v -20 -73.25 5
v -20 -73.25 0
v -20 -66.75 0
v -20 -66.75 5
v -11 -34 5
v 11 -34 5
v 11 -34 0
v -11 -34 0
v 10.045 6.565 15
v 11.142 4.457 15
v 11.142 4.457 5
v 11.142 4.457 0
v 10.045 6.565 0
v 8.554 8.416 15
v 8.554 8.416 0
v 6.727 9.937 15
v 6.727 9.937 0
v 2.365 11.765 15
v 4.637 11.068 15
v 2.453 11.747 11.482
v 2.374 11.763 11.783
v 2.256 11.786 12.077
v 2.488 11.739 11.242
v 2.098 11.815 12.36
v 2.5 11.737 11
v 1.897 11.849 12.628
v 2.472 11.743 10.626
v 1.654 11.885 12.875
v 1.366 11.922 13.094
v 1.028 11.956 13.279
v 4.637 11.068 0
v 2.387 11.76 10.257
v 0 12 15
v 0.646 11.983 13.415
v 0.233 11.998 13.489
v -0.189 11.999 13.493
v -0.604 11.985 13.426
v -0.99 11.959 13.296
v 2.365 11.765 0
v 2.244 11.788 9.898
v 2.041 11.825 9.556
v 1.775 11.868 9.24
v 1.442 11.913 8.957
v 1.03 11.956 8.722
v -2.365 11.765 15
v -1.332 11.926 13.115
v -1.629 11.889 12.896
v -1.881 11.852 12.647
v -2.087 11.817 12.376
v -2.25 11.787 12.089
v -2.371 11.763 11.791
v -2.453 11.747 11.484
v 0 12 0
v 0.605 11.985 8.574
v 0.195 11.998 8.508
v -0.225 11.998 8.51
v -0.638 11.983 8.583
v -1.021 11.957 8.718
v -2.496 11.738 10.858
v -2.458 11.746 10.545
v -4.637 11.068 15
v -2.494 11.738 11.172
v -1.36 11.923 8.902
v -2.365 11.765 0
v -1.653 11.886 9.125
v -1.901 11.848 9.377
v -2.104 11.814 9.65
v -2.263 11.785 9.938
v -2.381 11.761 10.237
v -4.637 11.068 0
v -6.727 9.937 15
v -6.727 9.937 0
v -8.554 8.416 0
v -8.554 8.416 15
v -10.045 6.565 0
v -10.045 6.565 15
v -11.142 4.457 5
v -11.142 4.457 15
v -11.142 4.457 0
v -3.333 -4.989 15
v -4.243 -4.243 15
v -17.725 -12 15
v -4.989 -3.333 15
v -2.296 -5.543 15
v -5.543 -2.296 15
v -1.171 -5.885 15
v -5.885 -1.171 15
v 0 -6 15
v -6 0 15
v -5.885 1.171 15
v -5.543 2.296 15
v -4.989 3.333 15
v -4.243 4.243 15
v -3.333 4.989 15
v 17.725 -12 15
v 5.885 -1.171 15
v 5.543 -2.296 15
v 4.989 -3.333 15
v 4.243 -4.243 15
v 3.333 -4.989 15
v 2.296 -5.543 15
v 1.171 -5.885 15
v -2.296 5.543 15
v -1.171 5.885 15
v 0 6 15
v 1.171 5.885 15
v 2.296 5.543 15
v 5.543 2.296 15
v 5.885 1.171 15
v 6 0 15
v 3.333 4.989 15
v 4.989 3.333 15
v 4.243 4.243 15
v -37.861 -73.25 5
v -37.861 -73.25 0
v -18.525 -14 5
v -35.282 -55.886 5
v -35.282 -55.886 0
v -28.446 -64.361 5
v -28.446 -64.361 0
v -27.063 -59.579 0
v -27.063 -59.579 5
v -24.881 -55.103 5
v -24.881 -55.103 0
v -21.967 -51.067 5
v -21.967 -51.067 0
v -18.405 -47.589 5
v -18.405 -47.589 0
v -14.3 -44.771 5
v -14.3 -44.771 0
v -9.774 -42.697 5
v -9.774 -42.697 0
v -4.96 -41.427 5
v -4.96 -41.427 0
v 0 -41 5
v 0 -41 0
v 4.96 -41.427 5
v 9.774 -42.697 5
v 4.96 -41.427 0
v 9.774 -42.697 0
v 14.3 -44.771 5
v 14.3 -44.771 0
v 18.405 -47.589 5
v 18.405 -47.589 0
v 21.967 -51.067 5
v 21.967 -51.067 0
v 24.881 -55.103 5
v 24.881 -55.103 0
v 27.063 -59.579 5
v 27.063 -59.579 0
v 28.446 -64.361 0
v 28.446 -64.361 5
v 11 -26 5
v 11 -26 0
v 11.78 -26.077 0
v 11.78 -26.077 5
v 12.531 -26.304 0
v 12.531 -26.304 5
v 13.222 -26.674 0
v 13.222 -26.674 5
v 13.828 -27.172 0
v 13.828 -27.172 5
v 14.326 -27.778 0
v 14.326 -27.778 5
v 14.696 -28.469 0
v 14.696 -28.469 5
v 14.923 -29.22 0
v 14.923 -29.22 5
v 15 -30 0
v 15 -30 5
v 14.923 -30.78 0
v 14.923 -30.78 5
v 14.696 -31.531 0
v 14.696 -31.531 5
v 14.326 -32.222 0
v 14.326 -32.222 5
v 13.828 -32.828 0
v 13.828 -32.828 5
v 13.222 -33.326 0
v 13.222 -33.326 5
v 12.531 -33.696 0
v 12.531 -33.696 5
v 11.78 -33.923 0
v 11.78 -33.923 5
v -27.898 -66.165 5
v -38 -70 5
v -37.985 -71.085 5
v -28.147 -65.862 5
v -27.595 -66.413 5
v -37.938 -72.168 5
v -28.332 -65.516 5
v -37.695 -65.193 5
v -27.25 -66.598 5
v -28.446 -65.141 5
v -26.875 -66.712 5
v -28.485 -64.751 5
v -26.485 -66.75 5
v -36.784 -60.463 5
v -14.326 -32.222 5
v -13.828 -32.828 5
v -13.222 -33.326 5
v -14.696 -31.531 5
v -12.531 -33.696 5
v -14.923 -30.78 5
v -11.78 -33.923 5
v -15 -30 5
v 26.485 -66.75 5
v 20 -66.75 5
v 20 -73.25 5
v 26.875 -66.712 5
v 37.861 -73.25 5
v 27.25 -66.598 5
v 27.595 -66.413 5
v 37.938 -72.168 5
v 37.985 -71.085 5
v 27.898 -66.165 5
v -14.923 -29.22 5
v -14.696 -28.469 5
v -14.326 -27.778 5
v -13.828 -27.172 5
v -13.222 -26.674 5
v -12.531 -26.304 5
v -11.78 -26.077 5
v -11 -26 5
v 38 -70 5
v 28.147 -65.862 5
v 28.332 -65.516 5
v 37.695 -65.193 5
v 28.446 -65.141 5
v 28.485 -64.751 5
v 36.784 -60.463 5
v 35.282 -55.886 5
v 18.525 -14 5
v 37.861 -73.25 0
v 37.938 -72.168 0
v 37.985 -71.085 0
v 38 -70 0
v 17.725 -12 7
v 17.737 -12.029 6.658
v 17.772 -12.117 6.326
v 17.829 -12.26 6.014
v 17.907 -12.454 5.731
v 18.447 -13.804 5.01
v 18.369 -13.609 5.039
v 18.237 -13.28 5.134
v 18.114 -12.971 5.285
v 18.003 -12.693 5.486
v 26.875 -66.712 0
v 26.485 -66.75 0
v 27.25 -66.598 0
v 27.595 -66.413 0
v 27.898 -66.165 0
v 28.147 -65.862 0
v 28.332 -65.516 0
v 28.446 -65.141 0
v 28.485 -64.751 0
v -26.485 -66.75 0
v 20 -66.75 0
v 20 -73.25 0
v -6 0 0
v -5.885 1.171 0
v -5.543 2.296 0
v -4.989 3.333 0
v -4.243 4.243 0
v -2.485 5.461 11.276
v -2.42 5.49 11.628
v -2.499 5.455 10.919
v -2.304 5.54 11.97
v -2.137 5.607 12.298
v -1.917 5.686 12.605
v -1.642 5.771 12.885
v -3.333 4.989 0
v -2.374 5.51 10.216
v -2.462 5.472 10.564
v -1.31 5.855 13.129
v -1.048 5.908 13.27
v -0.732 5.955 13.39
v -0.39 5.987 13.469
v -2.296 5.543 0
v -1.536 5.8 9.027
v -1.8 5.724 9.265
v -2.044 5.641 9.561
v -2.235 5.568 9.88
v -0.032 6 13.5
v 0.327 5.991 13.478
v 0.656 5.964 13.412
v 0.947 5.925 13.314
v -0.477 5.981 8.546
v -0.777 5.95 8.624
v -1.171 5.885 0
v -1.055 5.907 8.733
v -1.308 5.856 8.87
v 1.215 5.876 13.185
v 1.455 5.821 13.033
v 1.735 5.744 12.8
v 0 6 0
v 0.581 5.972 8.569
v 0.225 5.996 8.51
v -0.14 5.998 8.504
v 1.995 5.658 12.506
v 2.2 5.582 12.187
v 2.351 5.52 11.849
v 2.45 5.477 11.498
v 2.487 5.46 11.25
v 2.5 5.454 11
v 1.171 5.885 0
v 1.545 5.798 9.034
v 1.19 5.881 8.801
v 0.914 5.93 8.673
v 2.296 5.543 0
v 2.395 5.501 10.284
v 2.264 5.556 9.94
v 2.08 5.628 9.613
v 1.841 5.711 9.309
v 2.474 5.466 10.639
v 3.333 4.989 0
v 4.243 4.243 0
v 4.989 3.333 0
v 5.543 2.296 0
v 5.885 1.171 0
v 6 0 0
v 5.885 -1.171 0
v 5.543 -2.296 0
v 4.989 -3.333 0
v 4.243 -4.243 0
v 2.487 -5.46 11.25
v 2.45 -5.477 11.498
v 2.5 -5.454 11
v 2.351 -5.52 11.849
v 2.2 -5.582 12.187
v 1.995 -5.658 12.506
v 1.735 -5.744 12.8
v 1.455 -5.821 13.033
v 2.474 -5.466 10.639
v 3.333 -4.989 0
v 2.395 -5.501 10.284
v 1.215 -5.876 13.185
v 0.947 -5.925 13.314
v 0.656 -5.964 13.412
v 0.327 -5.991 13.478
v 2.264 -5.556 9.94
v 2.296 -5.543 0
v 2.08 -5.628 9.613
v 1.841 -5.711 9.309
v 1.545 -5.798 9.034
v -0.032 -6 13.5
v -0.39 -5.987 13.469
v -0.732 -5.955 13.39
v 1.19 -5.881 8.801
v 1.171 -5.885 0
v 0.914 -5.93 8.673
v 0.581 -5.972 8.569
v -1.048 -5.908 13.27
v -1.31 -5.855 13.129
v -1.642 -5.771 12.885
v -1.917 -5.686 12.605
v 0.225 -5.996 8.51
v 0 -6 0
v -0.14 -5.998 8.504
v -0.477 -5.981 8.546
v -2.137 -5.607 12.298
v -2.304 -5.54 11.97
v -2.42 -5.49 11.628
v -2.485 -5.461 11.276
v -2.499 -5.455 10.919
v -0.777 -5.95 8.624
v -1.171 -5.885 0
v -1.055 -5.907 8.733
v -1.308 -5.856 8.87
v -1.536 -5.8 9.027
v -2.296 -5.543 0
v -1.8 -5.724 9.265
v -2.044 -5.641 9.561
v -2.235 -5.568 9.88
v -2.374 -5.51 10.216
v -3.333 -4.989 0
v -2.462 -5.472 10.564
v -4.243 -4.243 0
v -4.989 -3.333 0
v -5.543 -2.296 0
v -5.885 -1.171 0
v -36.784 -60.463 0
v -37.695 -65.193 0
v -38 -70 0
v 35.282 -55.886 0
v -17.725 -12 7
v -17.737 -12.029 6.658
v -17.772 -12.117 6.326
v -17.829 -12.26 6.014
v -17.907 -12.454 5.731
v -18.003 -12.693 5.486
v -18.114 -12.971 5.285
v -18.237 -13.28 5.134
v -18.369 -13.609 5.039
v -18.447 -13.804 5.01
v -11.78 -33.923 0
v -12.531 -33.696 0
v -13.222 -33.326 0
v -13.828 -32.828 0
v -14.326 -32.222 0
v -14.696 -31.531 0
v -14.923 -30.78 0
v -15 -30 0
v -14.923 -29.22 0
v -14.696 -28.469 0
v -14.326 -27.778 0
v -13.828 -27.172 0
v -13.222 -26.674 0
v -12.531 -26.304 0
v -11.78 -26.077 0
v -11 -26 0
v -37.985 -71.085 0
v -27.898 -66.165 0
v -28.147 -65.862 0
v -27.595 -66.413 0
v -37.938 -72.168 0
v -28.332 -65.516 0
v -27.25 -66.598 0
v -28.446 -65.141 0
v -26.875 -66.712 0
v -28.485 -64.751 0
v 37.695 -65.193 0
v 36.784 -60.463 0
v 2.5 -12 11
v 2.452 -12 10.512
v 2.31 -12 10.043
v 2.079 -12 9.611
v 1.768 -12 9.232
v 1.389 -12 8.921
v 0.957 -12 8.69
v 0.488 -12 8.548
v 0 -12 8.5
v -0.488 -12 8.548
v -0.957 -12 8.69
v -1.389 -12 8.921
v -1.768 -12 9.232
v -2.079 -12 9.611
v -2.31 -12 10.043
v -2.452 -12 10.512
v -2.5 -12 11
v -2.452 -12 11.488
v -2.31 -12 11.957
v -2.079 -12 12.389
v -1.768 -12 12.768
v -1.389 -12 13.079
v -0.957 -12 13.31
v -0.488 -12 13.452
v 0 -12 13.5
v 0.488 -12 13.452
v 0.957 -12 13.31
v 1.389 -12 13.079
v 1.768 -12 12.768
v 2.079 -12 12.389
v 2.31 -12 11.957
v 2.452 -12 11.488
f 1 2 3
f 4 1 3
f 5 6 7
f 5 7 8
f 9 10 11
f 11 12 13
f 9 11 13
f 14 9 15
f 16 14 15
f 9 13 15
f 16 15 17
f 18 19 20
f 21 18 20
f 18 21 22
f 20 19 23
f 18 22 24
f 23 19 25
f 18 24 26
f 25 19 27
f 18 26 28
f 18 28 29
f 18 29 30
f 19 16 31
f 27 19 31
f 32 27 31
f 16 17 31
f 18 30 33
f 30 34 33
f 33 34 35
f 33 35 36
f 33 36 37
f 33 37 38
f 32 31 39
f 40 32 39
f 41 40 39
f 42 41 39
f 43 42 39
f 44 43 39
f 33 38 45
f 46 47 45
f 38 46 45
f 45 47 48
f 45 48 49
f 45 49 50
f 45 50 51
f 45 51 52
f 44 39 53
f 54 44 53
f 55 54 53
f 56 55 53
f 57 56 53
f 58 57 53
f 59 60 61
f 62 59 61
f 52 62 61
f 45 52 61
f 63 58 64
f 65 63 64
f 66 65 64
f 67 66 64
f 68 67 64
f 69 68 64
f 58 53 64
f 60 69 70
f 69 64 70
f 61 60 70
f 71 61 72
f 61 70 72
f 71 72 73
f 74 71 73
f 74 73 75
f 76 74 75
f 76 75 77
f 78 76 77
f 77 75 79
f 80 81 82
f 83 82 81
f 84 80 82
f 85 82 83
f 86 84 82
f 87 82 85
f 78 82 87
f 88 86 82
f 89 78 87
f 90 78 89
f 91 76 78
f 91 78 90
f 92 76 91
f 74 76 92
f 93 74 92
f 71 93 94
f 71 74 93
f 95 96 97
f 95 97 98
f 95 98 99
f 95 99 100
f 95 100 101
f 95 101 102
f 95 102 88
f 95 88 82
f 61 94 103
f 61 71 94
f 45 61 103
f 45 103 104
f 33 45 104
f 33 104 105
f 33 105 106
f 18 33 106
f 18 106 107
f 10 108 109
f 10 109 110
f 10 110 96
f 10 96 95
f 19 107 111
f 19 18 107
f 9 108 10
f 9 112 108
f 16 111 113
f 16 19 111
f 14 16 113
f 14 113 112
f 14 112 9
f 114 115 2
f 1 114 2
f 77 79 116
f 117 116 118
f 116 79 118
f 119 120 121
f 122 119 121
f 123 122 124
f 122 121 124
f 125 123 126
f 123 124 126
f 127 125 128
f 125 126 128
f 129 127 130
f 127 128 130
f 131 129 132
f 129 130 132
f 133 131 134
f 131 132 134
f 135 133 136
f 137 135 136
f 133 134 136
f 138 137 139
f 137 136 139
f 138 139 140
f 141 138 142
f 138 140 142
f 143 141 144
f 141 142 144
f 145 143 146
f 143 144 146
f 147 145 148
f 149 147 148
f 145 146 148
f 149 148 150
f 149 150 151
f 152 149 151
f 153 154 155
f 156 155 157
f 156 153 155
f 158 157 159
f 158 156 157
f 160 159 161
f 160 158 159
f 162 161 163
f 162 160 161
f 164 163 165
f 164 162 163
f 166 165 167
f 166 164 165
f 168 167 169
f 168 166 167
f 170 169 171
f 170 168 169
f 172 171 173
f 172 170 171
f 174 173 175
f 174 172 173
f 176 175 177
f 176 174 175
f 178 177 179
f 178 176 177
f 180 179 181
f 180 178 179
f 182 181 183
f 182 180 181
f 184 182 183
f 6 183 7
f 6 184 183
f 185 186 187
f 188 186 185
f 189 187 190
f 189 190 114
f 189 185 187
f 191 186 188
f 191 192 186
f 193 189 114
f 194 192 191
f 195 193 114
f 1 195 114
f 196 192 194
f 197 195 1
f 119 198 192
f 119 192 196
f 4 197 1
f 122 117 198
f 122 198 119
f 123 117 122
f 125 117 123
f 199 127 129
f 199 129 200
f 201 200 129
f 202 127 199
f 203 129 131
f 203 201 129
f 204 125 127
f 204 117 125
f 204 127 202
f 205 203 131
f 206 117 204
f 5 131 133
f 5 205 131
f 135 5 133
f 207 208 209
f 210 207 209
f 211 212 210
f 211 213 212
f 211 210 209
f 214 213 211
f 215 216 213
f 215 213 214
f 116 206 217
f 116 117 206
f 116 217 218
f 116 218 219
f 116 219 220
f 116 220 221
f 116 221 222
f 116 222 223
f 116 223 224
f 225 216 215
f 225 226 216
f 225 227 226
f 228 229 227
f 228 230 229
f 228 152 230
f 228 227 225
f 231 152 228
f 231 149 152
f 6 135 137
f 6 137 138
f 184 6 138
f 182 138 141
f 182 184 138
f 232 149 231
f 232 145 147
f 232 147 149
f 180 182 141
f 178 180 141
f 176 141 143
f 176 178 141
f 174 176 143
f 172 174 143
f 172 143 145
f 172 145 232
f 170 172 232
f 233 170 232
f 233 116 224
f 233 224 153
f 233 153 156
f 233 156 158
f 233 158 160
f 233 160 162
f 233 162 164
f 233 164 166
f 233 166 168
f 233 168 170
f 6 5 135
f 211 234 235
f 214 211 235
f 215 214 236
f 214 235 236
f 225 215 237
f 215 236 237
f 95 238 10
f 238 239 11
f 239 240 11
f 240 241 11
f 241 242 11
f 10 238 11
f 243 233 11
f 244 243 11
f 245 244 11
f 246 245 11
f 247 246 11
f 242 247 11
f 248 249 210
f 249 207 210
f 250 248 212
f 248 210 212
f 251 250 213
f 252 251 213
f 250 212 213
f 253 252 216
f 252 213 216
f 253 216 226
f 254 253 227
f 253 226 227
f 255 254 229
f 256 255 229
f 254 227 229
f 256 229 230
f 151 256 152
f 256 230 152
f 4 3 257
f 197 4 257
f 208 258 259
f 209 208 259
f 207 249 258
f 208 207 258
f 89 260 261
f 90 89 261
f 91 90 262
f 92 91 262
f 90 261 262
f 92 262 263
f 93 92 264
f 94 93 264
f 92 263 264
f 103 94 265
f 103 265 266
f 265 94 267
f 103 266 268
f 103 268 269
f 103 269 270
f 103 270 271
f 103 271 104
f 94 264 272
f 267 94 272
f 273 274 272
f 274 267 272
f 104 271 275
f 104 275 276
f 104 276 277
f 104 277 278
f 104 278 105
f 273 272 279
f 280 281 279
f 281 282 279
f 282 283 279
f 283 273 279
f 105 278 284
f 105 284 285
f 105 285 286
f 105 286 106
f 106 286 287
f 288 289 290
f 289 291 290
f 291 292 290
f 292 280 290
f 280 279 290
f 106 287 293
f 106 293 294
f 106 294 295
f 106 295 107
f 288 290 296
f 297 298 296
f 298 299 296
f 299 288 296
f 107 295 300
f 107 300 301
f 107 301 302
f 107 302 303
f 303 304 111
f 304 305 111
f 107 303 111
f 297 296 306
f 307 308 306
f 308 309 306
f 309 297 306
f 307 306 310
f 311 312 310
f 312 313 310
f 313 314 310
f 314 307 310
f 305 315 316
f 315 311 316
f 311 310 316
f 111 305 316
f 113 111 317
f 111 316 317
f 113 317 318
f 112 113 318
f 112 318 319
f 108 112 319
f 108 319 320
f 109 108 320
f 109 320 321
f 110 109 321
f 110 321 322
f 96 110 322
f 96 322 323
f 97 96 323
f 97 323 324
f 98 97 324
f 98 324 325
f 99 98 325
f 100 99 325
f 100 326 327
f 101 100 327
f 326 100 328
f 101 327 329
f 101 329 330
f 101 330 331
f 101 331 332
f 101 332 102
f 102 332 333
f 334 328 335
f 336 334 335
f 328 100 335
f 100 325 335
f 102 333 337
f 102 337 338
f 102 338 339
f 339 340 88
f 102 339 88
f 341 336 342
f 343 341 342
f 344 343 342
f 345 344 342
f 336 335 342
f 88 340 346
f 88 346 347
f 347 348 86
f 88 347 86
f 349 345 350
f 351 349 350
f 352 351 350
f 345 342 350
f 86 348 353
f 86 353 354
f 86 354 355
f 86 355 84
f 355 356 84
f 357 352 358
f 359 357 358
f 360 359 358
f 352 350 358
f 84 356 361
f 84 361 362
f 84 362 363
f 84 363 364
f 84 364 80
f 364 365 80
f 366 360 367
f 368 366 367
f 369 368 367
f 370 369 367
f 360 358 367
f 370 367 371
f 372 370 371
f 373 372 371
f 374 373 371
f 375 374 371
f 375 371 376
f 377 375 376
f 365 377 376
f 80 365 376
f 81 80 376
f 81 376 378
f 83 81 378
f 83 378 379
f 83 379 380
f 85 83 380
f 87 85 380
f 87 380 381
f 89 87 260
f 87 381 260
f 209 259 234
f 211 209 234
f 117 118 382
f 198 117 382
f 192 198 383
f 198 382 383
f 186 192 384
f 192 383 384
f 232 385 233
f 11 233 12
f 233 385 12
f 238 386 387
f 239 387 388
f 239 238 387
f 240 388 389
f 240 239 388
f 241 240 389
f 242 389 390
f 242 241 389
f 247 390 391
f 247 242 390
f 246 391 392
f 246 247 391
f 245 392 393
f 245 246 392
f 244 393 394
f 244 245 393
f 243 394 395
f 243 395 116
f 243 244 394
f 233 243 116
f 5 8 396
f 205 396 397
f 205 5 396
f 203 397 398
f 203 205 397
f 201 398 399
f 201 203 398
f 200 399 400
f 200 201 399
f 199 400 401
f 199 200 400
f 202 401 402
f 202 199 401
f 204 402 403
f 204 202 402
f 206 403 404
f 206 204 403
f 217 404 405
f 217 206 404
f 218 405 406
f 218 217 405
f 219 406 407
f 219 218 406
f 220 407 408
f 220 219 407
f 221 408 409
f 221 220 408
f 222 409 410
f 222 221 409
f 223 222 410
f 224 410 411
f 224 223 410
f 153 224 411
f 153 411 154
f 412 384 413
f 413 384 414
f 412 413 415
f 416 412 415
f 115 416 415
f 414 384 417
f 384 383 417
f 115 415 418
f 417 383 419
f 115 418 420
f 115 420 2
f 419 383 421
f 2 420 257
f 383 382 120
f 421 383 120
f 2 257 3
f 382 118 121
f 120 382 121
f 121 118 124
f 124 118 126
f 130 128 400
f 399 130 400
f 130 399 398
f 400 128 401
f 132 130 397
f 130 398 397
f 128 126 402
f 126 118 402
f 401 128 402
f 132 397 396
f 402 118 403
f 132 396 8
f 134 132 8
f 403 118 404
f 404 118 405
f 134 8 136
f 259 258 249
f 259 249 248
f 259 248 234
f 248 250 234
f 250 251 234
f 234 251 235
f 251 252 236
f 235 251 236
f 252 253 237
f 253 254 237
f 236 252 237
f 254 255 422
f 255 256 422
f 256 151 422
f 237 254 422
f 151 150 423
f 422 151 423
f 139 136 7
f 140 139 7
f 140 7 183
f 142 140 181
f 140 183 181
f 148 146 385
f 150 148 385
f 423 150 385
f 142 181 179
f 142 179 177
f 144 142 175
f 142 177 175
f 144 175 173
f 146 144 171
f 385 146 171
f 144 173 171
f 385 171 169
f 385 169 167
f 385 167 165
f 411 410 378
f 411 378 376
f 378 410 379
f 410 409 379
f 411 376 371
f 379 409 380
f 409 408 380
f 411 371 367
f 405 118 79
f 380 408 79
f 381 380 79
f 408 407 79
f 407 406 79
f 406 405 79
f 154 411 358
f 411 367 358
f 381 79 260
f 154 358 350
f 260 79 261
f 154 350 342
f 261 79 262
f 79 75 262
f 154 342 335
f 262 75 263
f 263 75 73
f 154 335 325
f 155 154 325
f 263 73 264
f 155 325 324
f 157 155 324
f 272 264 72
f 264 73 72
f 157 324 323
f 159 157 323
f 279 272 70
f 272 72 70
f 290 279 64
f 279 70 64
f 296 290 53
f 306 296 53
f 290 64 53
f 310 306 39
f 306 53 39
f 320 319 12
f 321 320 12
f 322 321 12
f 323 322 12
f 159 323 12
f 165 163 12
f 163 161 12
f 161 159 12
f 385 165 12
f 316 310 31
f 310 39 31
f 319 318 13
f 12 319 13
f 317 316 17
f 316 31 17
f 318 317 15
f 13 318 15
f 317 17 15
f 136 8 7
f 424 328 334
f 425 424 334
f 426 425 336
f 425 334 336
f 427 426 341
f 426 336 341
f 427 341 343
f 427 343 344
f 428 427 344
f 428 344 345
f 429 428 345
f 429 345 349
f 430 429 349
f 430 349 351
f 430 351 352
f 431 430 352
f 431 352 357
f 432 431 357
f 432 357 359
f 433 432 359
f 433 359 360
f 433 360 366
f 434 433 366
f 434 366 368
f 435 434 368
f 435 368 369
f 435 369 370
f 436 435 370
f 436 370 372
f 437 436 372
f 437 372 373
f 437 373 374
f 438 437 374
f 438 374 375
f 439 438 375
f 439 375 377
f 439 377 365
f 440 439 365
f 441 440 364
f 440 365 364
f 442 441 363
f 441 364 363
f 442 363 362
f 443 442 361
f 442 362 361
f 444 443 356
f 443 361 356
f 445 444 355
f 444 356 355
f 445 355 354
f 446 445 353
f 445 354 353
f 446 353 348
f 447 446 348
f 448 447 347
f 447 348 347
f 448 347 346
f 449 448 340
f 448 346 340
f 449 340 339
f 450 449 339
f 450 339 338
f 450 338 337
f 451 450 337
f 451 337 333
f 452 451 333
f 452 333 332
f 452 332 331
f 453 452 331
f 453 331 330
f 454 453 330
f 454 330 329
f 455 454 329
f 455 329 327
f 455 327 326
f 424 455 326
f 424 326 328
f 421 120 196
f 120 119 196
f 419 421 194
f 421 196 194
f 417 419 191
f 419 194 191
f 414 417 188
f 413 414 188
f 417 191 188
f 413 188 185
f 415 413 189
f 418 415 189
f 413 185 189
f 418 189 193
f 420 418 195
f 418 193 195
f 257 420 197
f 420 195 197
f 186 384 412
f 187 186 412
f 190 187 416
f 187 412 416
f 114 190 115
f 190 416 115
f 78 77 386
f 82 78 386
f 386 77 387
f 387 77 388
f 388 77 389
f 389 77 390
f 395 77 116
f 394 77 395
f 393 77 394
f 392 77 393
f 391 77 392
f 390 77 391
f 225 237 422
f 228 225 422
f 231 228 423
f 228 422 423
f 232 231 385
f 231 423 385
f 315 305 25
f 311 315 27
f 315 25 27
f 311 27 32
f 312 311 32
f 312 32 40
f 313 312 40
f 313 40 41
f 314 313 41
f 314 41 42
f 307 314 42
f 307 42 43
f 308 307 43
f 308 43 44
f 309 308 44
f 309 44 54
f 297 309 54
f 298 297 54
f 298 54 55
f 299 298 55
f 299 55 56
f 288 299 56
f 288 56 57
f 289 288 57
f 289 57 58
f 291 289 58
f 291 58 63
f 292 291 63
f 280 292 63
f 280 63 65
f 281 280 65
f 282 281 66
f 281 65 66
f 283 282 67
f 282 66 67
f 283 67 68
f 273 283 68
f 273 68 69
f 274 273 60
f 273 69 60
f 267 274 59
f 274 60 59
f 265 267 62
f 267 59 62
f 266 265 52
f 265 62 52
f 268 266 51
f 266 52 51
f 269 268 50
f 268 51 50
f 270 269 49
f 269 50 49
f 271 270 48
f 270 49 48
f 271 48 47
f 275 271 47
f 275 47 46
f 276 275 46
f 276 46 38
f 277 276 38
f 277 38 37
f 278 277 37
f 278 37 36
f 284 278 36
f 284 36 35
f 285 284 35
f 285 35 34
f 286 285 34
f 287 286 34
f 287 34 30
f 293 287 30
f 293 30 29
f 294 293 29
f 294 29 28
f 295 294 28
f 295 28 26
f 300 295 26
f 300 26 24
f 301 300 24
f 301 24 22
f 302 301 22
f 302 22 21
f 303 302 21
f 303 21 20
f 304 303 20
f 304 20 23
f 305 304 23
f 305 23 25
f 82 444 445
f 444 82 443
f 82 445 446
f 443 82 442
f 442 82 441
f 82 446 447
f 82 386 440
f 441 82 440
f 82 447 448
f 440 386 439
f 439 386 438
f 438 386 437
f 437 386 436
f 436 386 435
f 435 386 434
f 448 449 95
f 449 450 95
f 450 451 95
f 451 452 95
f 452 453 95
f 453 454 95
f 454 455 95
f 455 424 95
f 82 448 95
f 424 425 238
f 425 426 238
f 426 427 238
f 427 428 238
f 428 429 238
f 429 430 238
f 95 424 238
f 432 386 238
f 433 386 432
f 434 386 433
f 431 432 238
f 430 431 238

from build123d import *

# Parameters (mm, degrees)
ESTRUSIONE_ESTRUSIONE1_DEPTH = 5
ESTRUSIONE_ESTRUSIONE2_DEPTH = 10
RACCORDO1_R                  = 2
FORO_12_0_12_1_D             = 12
FORO_5_0_5_2_D               = 5
TAGLIO_ESTRUSIONE1_REACH     = 85.124


with BuildPart() as part:
    # Schizzo2 → Estrusione-Estrusione1 (new body)
    with BuildSketch(Plane.XY):
        with BuildLine():
            ThreePointArc((11.141538384, 4.457142857), (0, 12), (-11.141538384, 4.457142857))
            Line((-11.141538384, 4.457142857), (-35.281538214, -55.885714286))
            ThreePointArc((-35.281538214, -55.885714286), (-37.314196039, -62.813152713), (-38, -70))
            ThreePointArc((-38, -70), (-37.965175205, -71.626490584), (-37.860764652, -73.25))
            Line((-37.860764652, -73.25), (-20, -73.25))
            Line((-20, -73.25), (-20, -66.75))
            Line((-20, -66.75), (-28.817312505, -66.75))
            ThreePointArc((-28.817312505, -66.75), (0, -41), (28.817312505, -66.75))
            Line((28.817312505, -66.75), (20, -66.75))
            Line((20, -66.75), (20, -73.25))
            Line((20, -73.25), (37.860764652, -73.25))
            ThreePointArc((37.860764652, -73.25), (37.965175205, -71.626490584), (38, -70))
            ThreePointArc((38, -70), (37.314196039, -62.813152713), (35.281538214, -55.885714286))
            Line((35.281538214, -55.885714286), (11.141538384, 4.457142857))
        make_face()
    extrude(amount=ESTRUSIONE_ESTRUSIONE1_DEPTH)

    # Schizzo3 → Estrusione-Estrusione2 (add)
    with BuildSketch(Plane.XY.offset(5)):
        with BuildLine():
            Line((-17.725174701, -12), (17.725174701, -12))
            Line((17.725174701, -12), (11.141538384, 4.457142857))
            ThreePointArc((11.141538384, 4.457142857), (0, 12), (-11.141538384, 4.457142857))
            Line((-11.141538384, 4.457142857), (-17.725174701, -12))
        make_face()
    extrude(amount=ESTRUSIONE_ESTRUSIONE2_DEPTH)

    # Raccordo1
    raccordo1_edges = [part.edges().sort_by_distance(p)[0] for p in [
        (-28.817312505, -66.75, 2.5),
        (28.817312505, -66.75, 2.5),
        (0, -12, 5),
    ]]
    fillet(raccordo1_edges, radius=RACCORDO1_R)

    # Foro Ø12.0 (12)-1 (through all)
    with Locations(Plane.XY.offset(15)):
        with Locations((0, 0)):
            Hole(FORO_12_0_12_1_D / 2)

    # Foro Ø5.0 (5)-2 (through all)
    with Locations(Plane(origin=(0, -12, 0), x_dir=(-1, 0, 0), z_dir=(0, -1, 0))):
        with Locations((0, -11)):
            Hole(FORO_5_0_5_2_D / 2)

    # Schizzo8 → Taglio-Estrusione1 (cut, up to next)
    with BuildSketch(Plane.XY.offset(5), mode=Mode.PRIVATE) as taglio_estrusione1_sk1:
        with BuildLine():
            Line((-11, -26), (11, -26))
            ThreePointArc((11, -26), (15, -30), (11, -34))
            Line((11, -34), (-11, -34))
            ThreePointArc((-11, -34), (-15, -30), (-11, -26))
        make_face()
    taglio_estrusione1_tool1 = extrude(taglio_estrusione1_sk1.sketch, amount=-TAGLIO_ESTRUSIONE1_REACH, mode=Mode.PRIVATE) & part.part
    add(taglio_estrusione1_tool1.solids().sort_by_distance((0, -30, 5))[0], mode=Mode.SUBTRACT)


solid = part.part
